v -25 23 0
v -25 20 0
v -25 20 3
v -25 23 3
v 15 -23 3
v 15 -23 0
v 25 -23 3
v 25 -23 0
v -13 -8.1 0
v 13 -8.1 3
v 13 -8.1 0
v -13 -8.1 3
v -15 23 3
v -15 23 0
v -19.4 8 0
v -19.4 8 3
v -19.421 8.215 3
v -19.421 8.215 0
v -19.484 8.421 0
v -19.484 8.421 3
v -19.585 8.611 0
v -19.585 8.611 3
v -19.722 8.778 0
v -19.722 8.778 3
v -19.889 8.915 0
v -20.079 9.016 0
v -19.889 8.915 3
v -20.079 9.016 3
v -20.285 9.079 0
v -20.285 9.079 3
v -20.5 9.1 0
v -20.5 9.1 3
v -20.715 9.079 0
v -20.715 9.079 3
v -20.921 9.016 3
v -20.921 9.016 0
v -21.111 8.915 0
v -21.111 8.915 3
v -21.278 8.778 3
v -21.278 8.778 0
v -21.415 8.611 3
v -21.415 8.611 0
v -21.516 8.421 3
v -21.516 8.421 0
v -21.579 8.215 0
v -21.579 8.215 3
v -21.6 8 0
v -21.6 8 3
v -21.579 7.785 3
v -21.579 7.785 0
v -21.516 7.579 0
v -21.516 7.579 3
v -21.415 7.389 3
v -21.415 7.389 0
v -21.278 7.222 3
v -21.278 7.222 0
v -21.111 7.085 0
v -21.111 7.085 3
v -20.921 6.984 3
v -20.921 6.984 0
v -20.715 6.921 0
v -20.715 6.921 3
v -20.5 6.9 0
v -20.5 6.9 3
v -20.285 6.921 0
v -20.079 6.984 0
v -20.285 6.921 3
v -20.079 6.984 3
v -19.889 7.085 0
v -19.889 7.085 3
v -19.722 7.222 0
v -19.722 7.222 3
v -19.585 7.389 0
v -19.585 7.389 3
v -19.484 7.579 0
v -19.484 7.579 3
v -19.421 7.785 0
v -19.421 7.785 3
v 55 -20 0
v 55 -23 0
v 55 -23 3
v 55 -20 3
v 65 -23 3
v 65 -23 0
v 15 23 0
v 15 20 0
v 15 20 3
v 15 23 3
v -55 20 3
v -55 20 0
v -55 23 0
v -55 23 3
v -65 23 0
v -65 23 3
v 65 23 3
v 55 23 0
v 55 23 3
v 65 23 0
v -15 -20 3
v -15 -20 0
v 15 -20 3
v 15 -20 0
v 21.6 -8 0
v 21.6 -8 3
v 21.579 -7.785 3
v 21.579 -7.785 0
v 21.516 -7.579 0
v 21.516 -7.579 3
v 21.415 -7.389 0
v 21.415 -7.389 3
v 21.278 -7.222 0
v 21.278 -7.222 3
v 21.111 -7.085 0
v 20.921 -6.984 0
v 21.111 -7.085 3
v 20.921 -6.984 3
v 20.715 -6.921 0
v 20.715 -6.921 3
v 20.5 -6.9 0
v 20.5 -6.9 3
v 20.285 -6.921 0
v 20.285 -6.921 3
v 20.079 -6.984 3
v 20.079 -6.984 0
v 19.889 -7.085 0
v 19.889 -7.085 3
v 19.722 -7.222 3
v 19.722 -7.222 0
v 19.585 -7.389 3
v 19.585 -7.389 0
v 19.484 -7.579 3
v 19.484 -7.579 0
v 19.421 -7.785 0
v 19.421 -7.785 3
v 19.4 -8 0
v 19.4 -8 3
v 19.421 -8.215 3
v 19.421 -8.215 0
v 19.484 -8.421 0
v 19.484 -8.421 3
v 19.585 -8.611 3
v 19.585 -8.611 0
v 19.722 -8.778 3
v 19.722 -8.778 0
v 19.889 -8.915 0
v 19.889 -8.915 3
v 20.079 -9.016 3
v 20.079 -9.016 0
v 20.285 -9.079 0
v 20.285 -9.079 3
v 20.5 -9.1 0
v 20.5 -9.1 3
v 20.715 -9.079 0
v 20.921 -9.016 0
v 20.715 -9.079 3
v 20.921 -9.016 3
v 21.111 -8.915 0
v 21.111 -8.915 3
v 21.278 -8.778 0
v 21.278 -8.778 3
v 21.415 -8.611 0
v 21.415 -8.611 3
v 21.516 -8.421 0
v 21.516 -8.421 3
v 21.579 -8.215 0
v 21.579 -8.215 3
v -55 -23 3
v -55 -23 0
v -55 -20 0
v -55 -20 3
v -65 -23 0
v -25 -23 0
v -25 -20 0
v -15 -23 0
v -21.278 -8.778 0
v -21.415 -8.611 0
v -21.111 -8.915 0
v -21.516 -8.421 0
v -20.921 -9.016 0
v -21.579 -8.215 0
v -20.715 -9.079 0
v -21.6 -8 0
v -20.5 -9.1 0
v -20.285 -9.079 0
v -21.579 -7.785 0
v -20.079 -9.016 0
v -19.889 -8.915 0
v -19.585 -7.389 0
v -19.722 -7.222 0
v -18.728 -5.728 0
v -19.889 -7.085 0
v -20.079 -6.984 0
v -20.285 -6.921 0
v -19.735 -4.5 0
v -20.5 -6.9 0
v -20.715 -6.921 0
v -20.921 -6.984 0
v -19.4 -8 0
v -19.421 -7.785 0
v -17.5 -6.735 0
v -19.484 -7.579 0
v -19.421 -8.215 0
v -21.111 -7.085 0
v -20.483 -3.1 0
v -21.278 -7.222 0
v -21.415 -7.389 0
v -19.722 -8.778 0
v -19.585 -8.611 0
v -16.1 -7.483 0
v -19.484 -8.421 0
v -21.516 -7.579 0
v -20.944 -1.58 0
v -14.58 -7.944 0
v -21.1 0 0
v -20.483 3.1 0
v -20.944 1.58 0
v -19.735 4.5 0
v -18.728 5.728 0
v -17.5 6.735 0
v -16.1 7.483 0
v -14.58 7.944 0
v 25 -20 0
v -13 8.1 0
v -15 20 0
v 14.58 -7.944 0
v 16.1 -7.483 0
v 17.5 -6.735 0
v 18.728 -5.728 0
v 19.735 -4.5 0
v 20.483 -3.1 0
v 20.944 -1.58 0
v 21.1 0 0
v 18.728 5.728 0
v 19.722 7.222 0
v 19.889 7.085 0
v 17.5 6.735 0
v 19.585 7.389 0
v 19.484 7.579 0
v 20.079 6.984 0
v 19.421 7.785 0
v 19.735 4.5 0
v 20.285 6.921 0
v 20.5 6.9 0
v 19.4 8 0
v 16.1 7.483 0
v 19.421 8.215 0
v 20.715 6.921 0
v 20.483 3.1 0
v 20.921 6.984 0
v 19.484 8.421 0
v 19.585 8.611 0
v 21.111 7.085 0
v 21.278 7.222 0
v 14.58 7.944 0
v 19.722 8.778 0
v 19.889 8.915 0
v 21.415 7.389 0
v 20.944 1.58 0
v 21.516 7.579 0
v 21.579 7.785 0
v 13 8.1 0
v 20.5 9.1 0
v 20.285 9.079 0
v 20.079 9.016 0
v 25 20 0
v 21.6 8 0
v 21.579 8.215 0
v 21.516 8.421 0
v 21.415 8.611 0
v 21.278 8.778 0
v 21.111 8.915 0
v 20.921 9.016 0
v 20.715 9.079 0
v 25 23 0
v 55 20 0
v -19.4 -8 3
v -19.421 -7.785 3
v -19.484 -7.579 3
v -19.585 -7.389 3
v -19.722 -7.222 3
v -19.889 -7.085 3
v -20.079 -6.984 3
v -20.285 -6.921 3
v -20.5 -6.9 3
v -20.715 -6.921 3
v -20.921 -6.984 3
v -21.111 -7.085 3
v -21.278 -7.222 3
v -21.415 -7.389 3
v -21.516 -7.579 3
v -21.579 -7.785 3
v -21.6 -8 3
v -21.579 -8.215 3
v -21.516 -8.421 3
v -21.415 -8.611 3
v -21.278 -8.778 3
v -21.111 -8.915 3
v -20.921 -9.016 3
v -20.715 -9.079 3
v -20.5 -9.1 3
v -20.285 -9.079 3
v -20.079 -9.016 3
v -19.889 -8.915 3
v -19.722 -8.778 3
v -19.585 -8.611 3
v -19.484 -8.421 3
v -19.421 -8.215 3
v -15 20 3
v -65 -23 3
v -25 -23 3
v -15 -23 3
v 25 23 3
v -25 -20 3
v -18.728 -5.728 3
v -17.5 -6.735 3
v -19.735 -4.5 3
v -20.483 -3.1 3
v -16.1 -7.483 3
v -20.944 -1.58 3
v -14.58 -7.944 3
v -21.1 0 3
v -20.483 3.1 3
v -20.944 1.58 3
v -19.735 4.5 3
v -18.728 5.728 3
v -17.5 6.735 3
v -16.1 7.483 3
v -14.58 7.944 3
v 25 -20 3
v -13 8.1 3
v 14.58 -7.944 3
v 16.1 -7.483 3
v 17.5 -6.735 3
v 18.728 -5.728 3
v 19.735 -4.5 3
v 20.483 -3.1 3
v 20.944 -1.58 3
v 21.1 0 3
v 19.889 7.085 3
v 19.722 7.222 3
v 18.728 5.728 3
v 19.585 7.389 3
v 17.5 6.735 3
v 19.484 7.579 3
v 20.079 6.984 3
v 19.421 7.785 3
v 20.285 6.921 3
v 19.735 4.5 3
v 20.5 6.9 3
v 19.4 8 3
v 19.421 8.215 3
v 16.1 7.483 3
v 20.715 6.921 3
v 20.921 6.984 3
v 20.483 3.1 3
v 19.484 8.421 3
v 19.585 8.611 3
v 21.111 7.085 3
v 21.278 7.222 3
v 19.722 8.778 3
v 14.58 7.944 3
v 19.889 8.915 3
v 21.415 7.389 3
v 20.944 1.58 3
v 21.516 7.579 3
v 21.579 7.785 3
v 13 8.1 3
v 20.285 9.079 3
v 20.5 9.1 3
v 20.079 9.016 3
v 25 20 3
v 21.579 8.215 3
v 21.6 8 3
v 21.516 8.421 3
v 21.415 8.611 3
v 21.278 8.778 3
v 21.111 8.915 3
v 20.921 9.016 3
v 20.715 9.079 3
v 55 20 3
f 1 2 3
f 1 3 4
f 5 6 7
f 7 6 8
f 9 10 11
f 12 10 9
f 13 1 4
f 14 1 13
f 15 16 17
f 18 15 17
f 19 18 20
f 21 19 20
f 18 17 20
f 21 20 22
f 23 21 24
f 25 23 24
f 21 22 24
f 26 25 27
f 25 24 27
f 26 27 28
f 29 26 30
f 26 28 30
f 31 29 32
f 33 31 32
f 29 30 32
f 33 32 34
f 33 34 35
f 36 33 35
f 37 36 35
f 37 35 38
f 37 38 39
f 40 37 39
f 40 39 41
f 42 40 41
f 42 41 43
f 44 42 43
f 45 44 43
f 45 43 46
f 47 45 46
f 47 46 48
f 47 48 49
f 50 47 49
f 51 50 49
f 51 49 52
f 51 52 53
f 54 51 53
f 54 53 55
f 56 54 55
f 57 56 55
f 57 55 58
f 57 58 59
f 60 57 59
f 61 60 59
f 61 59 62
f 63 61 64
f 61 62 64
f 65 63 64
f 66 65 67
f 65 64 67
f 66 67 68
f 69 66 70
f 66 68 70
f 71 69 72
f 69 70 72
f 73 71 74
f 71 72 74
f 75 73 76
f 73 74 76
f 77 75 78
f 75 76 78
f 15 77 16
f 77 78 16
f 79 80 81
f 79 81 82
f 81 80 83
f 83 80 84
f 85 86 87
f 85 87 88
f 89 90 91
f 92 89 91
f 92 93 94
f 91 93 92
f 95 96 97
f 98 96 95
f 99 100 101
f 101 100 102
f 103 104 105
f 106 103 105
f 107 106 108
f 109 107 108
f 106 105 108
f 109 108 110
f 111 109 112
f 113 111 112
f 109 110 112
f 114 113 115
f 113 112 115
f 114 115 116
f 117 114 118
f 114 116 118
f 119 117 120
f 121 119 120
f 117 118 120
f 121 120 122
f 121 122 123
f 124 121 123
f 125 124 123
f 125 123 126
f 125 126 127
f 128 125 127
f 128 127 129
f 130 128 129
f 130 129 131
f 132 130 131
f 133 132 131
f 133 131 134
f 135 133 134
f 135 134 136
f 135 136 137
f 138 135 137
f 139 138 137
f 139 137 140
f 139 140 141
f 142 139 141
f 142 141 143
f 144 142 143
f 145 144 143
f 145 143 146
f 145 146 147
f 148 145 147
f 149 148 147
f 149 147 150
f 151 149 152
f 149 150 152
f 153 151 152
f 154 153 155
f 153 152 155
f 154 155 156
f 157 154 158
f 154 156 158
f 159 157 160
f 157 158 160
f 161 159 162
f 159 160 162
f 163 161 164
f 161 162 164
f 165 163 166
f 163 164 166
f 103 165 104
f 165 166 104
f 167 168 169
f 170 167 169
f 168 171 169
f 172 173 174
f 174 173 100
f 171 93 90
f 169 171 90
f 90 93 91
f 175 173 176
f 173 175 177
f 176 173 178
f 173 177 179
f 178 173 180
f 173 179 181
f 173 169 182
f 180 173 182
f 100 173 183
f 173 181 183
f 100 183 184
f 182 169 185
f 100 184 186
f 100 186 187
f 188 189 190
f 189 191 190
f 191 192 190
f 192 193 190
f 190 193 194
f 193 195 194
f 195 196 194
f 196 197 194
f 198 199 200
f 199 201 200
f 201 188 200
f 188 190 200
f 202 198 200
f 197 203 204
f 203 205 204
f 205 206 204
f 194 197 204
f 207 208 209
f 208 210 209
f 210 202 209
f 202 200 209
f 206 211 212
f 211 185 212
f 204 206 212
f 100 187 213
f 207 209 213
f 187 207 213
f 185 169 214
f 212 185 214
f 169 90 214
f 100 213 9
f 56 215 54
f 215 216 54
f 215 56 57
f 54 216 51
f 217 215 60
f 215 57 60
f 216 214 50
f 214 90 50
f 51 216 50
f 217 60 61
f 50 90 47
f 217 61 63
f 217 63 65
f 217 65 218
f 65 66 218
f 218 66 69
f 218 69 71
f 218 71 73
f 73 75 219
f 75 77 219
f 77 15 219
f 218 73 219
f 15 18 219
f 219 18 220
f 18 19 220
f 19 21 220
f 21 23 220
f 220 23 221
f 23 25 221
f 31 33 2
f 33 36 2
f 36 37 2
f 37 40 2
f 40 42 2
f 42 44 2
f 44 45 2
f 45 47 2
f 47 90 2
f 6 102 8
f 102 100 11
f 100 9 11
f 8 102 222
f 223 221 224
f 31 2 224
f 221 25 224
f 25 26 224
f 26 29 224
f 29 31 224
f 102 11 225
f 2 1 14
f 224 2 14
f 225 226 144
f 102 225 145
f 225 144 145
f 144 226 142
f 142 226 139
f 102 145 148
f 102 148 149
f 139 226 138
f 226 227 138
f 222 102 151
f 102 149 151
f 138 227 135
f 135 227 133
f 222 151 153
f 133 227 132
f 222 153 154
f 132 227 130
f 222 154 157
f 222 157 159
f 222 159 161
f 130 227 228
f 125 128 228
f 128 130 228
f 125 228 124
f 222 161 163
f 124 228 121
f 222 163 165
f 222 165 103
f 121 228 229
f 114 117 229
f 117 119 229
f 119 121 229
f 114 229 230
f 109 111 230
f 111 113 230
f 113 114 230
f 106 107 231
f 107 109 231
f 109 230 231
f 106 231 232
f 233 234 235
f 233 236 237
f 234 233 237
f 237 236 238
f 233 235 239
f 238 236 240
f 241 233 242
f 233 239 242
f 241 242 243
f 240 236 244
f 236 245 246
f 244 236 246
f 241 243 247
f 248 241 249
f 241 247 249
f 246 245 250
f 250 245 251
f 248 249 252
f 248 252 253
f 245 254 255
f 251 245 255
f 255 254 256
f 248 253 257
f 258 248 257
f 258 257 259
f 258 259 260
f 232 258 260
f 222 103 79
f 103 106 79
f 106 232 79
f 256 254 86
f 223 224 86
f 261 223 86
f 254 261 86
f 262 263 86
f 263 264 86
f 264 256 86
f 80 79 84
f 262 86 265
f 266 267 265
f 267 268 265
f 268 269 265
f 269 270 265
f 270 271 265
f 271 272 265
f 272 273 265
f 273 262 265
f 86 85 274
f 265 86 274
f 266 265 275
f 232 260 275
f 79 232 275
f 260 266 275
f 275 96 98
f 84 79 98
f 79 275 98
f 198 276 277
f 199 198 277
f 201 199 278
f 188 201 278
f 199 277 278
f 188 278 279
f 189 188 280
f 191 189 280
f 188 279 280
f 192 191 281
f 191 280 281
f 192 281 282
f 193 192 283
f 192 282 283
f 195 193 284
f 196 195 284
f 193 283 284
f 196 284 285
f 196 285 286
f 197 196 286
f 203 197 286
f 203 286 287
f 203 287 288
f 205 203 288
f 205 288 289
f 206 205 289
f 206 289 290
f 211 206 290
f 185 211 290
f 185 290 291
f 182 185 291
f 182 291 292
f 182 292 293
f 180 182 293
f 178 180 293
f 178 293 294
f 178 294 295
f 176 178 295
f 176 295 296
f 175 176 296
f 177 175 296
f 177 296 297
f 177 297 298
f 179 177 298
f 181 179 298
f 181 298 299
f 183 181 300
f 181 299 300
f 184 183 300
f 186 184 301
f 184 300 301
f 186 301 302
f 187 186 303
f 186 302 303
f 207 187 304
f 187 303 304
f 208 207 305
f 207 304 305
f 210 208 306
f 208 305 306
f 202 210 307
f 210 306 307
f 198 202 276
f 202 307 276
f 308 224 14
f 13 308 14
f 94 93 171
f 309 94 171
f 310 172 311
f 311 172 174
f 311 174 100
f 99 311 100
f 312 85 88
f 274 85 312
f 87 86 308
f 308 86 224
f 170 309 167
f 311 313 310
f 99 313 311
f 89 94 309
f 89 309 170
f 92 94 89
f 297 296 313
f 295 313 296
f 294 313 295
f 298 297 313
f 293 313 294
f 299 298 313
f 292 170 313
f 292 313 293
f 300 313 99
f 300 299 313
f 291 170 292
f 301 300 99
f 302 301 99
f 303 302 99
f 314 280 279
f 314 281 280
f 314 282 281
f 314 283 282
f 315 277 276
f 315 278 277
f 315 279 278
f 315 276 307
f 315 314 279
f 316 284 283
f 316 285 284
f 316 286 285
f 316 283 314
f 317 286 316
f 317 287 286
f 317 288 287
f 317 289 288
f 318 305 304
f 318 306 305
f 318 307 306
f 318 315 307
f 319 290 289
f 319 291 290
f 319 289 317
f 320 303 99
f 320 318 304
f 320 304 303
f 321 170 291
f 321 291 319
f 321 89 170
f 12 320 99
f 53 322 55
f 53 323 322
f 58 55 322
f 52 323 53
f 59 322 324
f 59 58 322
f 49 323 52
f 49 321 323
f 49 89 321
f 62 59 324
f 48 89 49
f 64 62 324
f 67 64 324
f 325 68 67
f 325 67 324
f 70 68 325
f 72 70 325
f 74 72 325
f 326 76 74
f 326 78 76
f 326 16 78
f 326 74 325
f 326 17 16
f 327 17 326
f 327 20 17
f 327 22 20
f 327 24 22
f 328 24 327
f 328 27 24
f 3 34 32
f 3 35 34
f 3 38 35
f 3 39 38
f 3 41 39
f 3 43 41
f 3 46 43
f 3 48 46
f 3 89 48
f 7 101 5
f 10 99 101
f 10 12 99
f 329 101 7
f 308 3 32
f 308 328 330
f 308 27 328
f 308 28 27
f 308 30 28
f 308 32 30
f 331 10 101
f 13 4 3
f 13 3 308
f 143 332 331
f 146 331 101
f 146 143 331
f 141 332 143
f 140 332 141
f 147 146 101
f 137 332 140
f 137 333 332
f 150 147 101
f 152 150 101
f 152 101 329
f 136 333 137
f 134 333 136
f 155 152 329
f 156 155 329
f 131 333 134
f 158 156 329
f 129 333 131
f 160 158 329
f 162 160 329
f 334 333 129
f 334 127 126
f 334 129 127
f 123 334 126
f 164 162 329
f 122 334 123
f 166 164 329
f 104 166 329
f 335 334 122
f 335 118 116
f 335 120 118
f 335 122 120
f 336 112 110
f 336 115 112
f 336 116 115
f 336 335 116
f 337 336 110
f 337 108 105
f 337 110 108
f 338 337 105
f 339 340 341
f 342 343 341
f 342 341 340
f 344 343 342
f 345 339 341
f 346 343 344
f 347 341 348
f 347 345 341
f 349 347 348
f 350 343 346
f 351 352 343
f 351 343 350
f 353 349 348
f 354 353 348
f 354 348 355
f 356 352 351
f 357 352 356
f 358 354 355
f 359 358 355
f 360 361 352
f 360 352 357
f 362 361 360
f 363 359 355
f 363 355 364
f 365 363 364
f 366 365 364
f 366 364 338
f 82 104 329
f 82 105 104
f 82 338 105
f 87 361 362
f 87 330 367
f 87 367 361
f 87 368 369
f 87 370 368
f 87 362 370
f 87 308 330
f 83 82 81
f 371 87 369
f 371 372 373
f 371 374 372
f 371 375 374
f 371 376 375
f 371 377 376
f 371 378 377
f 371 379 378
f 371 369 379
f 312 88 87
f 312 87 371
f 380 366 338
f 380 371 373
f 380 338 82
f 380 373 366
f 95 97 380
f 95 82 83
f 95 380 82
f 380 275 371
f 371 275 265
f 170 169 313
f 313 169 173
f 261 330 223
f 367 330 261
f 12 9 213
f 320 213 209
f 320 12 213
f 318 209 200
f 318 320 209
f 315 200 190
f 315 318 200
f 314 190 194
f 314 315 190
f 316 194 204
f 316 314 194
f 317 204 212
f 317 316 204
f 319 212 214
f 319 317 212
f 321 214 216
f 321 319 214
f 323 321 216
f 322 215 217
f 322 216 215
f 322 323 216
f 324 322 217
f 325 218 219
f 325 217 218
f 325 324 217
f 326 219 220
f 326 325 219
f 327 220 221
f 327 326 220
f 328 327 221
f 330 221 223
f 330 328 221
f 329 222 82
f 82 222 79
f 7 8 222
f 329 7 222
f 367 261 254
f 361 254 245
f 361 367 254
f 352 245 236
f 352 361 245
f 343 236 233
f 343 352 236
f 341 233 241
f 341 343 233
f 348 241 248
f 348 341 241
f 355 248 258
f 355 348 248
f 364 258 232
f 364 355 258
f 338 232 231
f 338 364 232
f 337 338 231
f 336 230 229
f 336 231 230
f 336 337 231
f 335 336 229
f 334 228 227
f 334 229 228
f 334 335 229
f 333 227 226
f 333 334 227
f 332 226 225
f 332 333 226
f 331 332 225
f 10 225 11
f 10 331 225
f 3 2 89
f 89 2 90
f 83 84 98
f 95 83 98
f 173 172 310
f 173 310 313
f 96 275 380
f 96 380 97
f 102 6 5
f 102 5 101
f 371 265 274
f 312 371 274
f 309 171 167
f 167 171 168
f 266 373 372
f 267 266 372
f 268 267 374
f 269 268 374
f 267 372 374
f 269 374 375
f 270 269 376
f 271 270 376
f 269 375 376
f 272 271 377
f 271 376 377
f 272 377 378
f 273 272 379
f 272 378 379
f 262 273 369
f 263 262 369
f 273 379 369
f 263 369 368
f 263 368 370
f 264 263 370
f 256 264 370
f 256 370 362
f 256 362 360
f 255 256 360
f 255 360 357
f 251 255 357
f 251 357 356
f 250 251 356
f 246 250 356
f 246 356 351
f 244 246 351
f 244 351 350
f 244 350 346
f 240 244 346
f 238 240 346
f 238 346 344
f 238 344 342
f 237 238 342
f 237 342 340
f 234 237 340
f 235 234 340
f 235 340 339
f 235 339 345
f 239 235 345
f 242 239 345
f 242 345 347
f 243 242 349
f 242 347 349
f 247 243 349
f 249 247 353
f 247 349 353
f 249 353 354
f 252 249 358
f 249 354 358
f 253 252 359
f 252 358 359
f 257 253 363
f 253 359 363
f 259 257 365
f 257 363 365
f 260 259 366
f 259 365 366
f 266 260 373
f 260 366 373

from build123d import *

# Parameters (mm, degrees)
SKETCH1_W           = 10
SKETCH1_H           = 3
BOSS_EXTRUDE1_DEPTH = 3
SKETCH4_R           = 1.1
CUT_EXTRUDE2_DEPTH  = 70.014491232


with BuildPart() as part:
    # Sketch1 → Boss-Extrude1 (new body)
    with BuildSketch(Plane.XY):
        Polygon((-65, 20), (-65, 0), (65, 0), (65, 20), (55, 20), (25, 20), (15, 20), (-15, 20), (-25, 20), (-55, 20), align=None)
        Polygon((65, 0), (-65, 0), (-65, -20), (-55, -20), (-25, -20), (-15, -20), (15, -20), (25, -20), (55, -20), (65, -20), align=None)
        with Locations((-60, 21.5)):
            Rectangle(SKETCH1_W, SKETCH1_H)
        with Locations((-20, 21.5)):
            Rectangle(SKETCH1_W, SKETCH1_H)
        with Locations((20, 21.5)):
            Rectangle(SKETCH1_W, SKETCH1_H)
        with Locations((60, 21.5)):
            Rectangle(SKETCH1_W, SKETCH1_H)
        with Locations((60, -21.5)):
            Rectangle(SKETCH1_W, SKETCH1_H)
        with Locations((20, -21.5)):
            Rectangle(SKETCH1_W, SKETCH1_H)
        with Locations((-20, -21.5)):
            Rectangle(SKETCH1_W, SKETCH1_H)
        with Locations((-60, -21.5)):
            Rectangle(SKETCH1_W, SKETCH1_H)
    extrude(amount=BOSS_EXTRUDE1_DEPTH)

    # Sketch4 → Cut-Extrude2 (cut, through all)
    with BuildSketch(Plane.XY.offset(3)):
        with Locations((-20.5, 8)):
            Circle(SKETCH4_R)
        with Locations((-20.5, -8)):
            Circle(SKETCH4_R)
        with Locations((20.5, 8)):
            Circle(SKETCH4_R)
        with Locations((20.5, -8)):
            Circle(SKETCH4_R)
        with BuildLine():
            Line((-13, 8.1), (13, 8.1))
            ThreePointArc((13, 8.1), (21.1, 0), (13, -8.1))
            Line((13, -8.1), (-13, -8.1))
            ThreePointArc((-13, -8.1), (-21.1, 0), (-13, 8.1))
        make_face()
    extrude(amount=-CUT_EXTRUDE2_DEPTH, mode=Mode.SUBTRACT)


solid = part.part
